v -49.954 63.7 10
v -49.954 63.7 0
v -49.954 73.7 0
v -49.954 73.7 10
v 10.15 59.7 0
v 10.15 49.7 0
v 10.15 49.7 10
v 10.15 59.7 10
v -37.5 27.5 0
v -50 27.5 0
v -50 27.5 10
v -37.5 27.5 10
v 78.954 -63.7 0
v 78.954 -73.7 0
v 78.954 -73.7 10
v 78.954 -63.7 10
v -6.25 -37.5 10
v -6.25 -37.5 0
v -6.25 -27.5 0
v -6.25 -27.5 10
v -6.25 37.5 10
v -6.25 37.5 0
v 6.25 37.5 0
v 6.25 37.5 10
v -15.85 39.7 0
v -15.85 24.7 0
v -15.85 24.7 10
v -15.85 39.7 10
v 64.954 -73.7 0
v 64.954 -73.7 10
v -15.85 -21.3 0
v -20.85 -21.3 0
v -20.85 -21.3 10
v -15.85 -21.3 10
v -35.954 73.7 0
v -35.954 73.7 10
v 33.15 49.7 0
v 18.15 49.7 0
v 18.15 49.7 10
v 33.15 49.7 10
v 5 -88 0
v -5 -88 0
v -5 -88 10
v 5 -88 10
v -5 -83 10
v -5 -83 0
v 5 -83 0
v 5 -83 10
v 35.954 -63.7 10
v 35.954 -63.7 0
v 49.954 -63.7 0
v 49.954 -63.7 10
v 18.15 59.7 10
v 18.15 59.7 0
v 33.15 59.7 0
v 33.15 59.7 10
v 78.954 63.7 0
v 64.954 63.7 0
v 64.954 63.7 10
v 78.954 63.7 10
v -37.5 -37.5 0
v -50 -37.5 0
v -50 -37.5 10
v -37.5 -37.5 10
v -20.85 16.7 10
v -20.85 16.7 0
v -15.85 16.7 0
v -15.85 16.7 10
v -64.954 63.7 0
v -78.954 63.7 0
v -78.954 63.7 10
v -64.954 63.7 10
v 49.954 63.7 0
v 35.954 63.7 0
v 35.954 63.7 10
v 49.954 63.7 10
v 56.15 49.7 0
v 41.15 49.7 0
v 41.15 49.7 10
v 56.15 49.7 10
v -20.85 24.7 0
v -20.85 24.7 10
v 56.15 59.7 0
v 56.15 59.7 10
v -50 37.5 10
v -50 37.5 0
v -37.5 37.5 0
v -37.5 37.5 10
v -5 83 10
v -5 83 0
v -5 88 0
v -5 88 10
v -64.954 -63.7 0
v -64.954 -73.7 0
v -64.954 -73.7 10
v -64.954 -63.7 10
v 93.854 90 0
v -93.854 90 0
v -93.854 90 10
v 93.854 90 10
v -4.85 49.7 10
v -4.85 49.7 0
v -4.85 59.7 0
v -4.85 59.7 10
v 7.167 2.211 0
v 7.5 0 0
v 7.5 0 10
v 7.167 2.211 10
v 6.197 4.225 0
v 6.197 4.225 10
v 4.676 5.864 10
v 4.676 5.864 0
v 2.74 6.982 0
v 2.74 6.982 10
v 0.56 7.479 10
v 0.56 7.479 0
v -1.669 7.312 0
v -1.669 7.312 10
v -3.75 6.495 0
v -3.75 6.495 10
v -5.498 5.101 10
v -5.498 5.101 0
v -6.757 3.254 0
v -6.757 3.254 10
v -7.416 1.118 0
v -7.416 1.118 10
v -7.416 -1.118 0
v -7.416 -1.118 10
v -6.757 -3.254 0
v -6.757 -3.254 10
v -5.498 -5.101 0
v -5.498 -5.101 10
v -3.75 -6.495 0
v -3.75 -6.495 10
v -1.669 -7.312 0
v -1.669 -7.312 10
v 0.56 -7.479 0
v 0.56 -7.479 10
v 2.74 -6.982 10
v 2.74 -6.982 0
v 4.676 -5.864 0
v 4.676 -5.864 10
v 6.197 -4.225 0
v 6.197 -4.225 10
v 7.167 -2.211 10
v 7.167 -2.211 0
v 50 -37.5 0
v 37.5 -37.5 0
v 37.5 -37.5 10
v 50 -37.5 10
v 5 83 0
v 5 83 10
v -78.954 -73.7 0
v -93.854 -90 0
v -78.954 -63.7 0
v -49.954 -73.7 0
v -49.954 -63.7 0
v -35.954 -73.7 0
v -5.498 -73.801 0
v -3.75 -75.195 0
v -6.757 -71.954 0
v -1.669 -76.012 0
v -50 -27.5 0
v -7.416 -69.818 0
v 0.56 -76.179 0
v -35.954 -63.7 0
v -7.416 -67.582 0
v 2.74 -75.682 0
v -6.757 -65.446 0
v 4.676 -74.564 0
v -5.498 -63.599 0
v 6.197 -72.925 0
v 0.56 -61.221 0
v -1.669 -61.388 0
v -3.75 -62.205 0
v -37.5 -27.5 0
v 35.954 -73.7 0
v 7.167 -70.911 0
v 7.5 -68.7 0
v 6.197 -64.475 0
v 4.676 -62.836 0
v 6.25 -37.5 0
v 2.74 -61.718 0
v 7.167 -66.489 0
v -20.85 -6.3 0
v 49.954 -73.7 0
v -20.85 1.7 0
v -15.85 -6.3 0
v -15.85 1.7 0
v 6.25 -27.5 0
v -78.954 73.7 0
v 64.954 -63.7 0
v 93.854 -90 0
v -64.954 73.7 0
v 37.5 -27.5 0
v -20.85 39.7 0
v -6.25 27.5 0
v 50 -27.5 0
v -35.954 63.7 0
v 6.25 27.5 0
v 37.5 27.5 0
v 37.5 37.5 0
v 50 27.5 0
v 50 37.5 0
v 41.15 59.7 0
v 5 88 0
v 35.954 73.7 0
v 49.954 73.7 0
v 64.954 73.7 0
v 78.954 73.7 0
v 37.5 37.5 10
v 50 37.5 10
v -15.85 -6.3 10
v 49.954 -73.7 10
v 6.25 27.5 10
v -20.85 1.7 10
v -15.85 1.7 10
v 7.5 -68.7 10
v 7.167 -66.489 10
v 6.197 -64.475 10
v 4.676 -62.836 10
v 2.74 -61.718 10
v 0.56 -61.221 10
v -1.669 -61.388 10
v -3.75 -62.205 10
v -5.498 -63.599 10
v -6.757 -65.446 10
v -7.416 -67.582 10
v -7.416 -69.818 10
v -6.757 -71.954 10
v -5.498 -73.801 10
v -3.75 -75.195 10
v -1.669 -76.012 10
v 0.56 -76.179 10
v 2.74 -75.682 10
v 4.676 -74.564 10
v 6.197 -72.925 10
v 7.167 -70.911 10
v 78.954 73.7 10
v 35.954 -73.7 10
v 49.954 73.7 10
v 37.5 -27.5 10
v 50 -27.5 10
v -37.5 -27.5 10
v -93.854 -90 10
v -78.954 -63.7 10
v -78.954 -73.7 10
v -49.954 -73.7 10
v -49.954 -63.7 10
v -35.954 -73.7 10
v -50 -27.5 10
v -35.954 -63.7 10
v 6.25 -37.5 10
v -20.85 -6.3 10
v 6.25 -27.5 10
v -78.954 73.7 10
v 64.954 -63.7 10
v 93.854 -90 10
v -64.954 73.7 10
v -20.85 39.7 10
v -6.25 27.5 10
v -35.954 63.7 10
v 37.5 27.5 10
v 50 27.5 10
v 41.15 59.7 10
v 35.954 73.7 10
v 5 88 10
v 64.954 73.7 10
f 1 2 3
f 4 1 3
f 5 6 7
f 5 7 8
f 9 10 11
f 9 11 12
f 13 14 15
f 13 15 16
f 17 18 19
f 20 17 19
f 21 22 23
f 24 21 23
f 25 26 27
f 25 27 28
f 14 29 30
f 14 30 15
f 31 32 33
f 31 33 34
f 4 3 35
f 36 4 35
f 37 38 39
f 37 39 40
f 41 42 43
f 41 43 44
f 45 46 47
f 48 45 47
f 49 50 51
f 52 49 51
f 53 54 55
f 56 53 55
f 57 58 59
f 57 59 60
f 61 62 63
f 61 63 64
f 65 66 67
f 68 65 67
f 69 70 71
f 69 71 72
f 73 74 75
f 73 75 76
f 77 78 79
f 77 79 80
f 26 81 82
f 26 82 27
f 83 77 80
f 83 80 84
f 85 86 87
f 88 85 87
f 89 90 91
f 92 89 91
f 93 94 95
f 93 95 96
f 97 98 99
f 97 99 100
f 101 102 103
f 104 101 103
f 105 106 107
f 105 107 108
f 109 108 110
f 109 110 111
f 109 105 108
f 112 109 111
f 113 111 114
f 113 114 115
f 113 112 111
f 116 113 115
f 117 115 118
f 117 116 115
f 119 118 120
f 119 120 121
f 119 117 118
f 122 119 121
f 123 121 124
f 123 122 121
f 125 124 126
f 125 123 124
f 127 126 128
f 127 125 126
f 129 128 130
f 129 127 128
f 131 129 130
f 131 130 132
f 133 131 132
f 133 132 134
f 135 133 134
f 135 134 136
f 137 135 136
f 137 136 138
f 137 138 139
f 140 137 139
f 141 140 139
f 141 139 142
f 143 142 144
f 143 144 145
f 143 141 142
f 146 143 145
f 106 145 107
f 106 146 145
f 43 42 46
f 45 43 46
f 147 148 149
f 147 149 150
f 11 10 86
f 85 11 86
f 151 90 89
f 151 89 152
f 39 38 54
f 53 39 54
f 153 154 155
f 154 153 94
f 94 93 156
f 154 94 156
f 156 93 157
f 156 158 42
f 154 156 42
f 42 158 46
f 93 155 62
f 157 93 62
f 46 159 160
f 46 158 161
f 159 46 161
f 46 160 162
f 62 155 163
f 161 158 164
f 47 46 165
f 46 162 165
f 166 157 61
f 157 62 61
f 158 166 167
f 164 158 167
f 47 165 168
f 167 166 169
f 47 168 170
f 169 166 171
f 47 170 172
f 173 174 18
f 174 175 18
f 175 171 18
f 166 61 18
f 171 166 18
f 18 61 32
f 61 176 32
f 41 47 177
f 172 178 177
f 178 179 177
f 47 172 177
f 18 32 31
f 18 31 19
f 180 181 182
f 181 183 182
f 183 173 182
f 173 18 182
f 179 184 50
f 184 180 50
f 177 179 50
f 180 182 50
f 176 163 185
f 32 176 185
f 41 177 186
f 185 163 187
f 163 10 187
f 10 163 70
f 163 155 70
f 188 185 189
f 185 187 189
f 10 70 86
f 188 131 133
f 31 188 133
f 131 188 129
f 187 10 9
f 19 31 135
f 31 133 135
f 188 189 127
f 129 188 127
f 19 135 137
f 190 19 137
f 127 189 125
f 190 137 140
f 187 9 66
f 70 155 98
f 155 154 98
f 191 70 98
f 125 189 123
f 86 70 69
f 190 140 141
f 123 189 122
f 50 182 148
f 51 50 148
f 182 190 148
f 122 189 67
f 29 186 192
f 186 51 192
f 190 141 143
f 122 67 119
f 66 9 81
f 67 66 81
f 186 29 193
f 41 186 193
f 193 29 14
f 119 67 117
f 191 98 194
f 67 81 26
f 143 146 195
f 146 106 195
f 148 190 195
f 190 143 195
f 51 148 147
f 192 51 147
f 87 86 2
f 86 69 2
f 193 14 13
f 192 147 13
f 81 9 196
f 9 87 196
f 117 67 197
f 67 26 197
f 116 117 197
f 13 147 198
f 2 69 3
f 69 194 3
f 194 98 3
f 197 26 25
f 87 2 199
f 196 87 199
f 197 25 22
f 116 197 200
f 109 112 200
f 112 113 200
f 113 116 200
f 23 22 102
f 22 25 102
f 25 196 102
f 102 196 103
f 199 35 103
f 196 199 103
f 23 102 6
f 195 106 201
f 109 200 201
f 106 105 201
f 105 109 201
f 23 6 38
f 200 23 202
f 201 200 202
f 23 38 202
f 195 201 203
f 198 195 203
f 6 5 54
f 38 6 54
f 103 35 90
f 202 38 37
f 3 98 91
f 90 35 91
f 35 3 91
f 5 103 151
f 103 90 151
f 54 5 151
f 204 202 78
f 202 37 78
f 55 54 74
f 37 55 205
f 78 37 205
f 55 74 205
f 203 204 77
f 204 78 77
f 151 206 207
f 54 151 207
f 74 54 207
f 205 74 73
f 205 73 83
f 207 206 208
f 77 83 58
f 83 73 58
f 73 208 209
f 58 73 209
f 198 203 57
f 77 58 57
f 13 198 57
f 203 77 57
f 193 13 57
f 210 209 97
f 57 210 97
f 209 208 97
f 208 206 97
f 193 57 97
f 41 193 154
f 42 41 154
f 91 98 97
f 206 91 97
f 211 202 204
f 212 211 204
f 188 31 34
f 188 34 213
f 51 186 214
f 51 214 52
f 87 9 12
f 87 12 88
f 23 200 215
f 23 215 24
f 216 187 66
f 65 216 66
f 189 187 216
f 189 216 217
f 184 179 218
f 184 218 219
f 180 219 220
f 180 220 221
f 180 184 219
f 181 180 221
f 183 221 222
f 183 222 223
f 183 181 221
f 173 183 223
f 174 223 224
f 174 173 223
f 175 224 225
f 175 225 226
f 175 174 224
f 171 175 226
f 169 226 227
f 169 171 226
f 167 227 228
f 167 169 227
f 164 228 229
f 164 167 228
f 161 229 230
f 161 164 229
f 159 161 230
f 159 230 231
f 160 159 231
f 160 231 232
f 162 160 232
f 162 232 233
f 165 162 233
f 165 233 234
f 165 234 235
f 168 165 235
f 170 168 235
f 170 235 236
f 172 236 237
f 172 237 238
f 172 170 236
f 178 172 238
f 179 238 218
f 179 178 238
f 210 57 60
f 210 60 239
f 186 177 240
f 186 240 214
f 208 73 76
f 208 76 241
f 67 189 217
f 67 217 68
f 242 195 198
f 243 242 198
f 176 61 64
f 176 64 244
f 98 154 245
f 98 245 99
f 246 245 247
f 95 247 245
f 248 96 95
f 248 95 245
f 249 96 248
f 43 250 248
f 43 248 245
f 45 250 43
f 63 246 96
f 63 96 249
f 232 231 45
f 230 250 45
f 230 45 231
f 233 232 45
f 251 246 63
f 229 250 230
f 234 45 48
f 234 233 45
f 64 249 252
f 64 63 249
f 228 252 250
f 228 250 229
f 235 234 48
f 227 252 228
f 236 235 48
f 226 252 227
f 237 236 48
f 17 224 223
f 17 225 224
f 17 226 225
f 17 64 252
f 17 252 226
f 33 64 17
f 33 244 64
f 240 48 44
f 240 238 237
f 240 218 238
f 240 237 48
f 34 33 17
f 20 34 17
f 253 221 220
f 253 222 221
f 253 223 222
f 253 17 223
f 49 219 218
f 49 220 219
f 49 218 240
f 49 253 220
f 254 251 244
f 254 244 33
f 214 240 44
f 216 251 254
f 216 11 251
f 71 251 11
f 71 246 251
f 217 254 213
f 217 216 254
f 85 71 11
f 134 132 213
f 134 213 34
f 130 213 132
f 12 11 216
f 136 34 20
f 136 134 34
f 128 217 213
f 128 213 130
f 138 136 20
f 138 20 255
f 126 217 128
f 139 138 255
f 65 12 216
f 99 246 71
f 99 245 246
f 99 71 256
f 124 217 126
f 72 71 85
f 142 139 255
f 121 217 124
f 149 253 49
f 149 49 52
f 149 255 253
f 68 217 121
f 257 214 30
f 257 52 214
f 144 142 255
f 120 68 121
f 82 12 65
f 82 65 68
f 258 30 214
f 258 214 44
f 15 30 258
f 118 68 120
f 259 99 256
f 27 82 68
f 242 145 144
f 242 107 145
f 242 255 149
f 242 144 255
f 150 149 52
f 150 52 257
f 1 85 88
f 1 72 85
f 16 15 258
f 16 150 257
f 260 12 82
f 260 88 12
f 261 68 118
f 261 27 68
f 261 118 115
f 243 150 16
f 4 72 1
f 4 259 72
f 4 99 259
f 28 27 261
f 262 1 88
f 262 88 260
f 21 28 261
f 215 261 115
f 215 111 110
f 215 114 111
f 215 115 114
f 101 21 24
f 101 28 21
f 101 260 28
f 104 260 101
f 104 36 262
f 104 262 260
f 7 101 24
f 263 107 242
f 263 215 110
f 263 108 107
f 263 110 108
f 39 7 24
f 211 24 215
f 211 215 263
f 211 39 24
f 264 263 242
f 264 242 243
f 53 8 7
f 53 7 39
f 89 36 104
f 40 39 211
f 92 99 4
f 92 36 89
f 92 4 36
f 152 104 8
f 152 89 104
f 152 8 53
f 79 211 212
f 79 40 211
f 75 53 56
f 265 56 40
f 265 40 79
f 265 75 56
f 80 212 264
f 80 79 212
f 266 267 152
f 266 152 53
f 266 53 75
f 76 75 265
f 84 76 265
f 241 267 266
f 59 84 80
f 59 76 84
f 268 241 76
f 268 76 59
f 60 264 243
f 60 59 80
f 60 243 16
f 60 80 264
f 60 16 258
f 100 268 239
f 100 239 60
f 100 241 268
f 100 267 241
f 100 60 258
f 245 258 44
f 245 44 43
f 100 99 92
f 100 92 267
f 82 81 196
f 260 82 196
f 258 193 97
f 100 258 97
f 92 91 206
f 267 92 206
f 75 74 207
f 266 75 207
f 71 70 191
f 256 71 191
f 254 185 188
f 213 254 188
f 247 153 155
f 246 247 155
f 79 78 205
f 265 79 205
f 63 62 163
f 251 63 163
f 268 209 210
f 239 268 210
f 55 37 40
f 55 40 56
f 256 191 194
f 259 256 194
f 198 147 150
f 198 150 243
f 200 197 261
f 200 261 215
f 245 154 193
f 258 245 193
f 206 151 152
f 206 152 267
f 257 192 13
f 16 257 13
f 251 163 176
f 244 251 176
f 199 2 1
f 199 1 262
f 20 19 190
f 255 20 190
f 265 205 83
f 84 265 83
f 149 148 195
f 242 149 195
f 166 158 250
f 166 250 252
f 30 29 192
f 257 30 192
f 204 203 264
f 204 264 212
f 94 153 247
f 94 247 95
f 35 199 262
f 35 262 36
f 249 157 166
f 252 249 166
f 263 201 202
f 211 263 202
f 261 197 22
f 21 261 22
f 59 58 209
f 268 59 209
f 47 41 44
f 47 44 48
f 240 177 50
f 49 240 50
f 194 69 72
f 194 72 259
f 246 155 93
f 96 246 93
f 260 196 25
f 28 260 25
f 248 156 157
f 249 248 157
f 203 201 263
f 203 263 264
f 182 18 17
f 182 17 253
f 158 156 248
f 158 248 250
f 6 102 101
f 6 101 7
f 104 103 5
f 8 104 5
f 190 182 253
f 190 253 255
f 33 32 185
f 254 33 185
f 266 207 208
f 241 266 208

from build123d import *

# Parameters (mm, degrees)
SKETCH1_W           = 187.7087417
SKETCH1_H           = 180
SKETCH1_W_2         = 14
SKETCH1_H_2         = 10
SKETCH1_W_3         = 12.5
SKETCH1_W_4         = 5
SKETCH1_H_3         = 15
SKETCH1_W_5         = 10
SKETCH1_H_4         = 5
SKETCH1_R           = 7.5
SKETCH1_W_6         = 15
BOSS_EXTRUDE1_DEPTH = 10


with BuildPart() as part:
    # Sketch1 → Boss-Extrude1 (new body)
    with BuildSketch(Plane.XY):
        Rectangle(SKETCH1_W, SKETCH1_H)
        with Locations((-71.95437085, -68.7)):
            Rectangle(SKETCH1_W_2, SKETCH1_H_2, mode=Mode.SUBTRACT)
        with Locations((-42.95437085, -68.7)):
            Rectangle(SKETCH1_W_2, SKETCH1_H_2, mode=Mode.SUBTRACT)
        with Locations((-43.75, -32.5)):
            Rectangle(SKETCH1_W_3, SKETCH1_H_2, mode=Mode.SUBTRACT)
        with Locations((-18.35, -13.8)):
            Rectangle(SKETCH1_W_4, SKETCH1_H_3, mode=Mode.SUBTRACT)
        with Locations((0, -85.5)):
            Rectangle(SKETCH1_W_5, SKETCH1_H_4, mode=Mode.SUBTRACT)
        with Locations((0, -68.7)):
            Circle(SKETCH1_R, mode=Mode.SUBTRACT)
        with Locations((42.95437085, -68.7)):
            Rectangle(SKETCH1_W_2, SKETCH1_H_2, mode=Mode.SUBTRACT)
        with Locations((71.95437085, -68.7)):
            Rectangle(SKETCH1_W_2, SKETCH1_H_2, mode=Mode.SUBTRACT)
        with Locations((0, -32.5)):
            Rectangle(SKETCH1_W_3, SKETCH1_H_2, mode=Mode.SUBTRACT)
        with Locations((43.75, -32.5)):
            Rectangle(SKETCH1_W_3, SKETCH1_H_2, mode=Mode.SUBTRACT)
        Circle(SKETCH1_R, mode=Mode.SUBTRACT)
        with Locations((-18.35, 9.2)):
            Rectangle(SKETCH1_W_4, SKETCH1_H_3, mode=Mode.SUBTRACT)
        with Locations((-43.75, 32.5)):
            Rectangle(SKETCH1_W_3, SKETCH1_H_2, mode=Mode.SUBTRACT)
        with Locations((-18.35, 32.2)):
            Rectangle(SKETCH1_W_4, SKETCH1_H_3, mode=Mode.SUBTRACT)
        with Locations((-71.95437085, 68.7)):
            Rectangle(SKETCH1_W_2, SKETCH1_H_2, mode=Mode.SUBTRACT)
        with Locations((-42.95437085, 68.7)):
            Rectangle(SKETCH1_W_2, SKETCH1_H_2, mode=Mode.SUBTRACT)
        with Locations((0, 32.5)):
            Rectangle(SKETCH1_W_3, SKETCH1_H_2, mode=Mode.SUBTRACT)
        with Locations((43.75, 32.5)):
            Rectangle(SKETCH1_W_3, SKETCH1_H_2, mode=Mode.SUBTRACT)
        with Locations((2.65, 54.7)):
            Rectangle(SKETCH1_W_6, SKETCH1_H_2, mode=Mode.SUBTRACT)
        with Locations((25.65, 54.7)):
            Rectangle(SKETCH1_W_6, SKETCH1_H_2, mode=Mode.SUBTRACT)
        with Locations((0, 85.5)):
            Rectangle(SKETCH1_W_5, SKETCH1_H_4, mode=Mode.SUBTRACT)
        with Locations((42.95437085, 68.7)):
            Rectangle(SKETCH1_W_2, SKETCH1_H_2, mode=Mode.SUBTRACT)
        with Locations((48.65, 54.7)):
            Rectangle(SKETCH1_W_6, SKETCH1_H_2, mode=Mode.SUBTRACT)
        with Locations((71.95437085, 68.7)):
            Rectangle(SKETCH1_W_2, SKETCH1_H_2, mode=Mode.SUBTRACT)
    extrude(amount=BOSS_EXTRUDE1_DEPTH)


solid = part.part
